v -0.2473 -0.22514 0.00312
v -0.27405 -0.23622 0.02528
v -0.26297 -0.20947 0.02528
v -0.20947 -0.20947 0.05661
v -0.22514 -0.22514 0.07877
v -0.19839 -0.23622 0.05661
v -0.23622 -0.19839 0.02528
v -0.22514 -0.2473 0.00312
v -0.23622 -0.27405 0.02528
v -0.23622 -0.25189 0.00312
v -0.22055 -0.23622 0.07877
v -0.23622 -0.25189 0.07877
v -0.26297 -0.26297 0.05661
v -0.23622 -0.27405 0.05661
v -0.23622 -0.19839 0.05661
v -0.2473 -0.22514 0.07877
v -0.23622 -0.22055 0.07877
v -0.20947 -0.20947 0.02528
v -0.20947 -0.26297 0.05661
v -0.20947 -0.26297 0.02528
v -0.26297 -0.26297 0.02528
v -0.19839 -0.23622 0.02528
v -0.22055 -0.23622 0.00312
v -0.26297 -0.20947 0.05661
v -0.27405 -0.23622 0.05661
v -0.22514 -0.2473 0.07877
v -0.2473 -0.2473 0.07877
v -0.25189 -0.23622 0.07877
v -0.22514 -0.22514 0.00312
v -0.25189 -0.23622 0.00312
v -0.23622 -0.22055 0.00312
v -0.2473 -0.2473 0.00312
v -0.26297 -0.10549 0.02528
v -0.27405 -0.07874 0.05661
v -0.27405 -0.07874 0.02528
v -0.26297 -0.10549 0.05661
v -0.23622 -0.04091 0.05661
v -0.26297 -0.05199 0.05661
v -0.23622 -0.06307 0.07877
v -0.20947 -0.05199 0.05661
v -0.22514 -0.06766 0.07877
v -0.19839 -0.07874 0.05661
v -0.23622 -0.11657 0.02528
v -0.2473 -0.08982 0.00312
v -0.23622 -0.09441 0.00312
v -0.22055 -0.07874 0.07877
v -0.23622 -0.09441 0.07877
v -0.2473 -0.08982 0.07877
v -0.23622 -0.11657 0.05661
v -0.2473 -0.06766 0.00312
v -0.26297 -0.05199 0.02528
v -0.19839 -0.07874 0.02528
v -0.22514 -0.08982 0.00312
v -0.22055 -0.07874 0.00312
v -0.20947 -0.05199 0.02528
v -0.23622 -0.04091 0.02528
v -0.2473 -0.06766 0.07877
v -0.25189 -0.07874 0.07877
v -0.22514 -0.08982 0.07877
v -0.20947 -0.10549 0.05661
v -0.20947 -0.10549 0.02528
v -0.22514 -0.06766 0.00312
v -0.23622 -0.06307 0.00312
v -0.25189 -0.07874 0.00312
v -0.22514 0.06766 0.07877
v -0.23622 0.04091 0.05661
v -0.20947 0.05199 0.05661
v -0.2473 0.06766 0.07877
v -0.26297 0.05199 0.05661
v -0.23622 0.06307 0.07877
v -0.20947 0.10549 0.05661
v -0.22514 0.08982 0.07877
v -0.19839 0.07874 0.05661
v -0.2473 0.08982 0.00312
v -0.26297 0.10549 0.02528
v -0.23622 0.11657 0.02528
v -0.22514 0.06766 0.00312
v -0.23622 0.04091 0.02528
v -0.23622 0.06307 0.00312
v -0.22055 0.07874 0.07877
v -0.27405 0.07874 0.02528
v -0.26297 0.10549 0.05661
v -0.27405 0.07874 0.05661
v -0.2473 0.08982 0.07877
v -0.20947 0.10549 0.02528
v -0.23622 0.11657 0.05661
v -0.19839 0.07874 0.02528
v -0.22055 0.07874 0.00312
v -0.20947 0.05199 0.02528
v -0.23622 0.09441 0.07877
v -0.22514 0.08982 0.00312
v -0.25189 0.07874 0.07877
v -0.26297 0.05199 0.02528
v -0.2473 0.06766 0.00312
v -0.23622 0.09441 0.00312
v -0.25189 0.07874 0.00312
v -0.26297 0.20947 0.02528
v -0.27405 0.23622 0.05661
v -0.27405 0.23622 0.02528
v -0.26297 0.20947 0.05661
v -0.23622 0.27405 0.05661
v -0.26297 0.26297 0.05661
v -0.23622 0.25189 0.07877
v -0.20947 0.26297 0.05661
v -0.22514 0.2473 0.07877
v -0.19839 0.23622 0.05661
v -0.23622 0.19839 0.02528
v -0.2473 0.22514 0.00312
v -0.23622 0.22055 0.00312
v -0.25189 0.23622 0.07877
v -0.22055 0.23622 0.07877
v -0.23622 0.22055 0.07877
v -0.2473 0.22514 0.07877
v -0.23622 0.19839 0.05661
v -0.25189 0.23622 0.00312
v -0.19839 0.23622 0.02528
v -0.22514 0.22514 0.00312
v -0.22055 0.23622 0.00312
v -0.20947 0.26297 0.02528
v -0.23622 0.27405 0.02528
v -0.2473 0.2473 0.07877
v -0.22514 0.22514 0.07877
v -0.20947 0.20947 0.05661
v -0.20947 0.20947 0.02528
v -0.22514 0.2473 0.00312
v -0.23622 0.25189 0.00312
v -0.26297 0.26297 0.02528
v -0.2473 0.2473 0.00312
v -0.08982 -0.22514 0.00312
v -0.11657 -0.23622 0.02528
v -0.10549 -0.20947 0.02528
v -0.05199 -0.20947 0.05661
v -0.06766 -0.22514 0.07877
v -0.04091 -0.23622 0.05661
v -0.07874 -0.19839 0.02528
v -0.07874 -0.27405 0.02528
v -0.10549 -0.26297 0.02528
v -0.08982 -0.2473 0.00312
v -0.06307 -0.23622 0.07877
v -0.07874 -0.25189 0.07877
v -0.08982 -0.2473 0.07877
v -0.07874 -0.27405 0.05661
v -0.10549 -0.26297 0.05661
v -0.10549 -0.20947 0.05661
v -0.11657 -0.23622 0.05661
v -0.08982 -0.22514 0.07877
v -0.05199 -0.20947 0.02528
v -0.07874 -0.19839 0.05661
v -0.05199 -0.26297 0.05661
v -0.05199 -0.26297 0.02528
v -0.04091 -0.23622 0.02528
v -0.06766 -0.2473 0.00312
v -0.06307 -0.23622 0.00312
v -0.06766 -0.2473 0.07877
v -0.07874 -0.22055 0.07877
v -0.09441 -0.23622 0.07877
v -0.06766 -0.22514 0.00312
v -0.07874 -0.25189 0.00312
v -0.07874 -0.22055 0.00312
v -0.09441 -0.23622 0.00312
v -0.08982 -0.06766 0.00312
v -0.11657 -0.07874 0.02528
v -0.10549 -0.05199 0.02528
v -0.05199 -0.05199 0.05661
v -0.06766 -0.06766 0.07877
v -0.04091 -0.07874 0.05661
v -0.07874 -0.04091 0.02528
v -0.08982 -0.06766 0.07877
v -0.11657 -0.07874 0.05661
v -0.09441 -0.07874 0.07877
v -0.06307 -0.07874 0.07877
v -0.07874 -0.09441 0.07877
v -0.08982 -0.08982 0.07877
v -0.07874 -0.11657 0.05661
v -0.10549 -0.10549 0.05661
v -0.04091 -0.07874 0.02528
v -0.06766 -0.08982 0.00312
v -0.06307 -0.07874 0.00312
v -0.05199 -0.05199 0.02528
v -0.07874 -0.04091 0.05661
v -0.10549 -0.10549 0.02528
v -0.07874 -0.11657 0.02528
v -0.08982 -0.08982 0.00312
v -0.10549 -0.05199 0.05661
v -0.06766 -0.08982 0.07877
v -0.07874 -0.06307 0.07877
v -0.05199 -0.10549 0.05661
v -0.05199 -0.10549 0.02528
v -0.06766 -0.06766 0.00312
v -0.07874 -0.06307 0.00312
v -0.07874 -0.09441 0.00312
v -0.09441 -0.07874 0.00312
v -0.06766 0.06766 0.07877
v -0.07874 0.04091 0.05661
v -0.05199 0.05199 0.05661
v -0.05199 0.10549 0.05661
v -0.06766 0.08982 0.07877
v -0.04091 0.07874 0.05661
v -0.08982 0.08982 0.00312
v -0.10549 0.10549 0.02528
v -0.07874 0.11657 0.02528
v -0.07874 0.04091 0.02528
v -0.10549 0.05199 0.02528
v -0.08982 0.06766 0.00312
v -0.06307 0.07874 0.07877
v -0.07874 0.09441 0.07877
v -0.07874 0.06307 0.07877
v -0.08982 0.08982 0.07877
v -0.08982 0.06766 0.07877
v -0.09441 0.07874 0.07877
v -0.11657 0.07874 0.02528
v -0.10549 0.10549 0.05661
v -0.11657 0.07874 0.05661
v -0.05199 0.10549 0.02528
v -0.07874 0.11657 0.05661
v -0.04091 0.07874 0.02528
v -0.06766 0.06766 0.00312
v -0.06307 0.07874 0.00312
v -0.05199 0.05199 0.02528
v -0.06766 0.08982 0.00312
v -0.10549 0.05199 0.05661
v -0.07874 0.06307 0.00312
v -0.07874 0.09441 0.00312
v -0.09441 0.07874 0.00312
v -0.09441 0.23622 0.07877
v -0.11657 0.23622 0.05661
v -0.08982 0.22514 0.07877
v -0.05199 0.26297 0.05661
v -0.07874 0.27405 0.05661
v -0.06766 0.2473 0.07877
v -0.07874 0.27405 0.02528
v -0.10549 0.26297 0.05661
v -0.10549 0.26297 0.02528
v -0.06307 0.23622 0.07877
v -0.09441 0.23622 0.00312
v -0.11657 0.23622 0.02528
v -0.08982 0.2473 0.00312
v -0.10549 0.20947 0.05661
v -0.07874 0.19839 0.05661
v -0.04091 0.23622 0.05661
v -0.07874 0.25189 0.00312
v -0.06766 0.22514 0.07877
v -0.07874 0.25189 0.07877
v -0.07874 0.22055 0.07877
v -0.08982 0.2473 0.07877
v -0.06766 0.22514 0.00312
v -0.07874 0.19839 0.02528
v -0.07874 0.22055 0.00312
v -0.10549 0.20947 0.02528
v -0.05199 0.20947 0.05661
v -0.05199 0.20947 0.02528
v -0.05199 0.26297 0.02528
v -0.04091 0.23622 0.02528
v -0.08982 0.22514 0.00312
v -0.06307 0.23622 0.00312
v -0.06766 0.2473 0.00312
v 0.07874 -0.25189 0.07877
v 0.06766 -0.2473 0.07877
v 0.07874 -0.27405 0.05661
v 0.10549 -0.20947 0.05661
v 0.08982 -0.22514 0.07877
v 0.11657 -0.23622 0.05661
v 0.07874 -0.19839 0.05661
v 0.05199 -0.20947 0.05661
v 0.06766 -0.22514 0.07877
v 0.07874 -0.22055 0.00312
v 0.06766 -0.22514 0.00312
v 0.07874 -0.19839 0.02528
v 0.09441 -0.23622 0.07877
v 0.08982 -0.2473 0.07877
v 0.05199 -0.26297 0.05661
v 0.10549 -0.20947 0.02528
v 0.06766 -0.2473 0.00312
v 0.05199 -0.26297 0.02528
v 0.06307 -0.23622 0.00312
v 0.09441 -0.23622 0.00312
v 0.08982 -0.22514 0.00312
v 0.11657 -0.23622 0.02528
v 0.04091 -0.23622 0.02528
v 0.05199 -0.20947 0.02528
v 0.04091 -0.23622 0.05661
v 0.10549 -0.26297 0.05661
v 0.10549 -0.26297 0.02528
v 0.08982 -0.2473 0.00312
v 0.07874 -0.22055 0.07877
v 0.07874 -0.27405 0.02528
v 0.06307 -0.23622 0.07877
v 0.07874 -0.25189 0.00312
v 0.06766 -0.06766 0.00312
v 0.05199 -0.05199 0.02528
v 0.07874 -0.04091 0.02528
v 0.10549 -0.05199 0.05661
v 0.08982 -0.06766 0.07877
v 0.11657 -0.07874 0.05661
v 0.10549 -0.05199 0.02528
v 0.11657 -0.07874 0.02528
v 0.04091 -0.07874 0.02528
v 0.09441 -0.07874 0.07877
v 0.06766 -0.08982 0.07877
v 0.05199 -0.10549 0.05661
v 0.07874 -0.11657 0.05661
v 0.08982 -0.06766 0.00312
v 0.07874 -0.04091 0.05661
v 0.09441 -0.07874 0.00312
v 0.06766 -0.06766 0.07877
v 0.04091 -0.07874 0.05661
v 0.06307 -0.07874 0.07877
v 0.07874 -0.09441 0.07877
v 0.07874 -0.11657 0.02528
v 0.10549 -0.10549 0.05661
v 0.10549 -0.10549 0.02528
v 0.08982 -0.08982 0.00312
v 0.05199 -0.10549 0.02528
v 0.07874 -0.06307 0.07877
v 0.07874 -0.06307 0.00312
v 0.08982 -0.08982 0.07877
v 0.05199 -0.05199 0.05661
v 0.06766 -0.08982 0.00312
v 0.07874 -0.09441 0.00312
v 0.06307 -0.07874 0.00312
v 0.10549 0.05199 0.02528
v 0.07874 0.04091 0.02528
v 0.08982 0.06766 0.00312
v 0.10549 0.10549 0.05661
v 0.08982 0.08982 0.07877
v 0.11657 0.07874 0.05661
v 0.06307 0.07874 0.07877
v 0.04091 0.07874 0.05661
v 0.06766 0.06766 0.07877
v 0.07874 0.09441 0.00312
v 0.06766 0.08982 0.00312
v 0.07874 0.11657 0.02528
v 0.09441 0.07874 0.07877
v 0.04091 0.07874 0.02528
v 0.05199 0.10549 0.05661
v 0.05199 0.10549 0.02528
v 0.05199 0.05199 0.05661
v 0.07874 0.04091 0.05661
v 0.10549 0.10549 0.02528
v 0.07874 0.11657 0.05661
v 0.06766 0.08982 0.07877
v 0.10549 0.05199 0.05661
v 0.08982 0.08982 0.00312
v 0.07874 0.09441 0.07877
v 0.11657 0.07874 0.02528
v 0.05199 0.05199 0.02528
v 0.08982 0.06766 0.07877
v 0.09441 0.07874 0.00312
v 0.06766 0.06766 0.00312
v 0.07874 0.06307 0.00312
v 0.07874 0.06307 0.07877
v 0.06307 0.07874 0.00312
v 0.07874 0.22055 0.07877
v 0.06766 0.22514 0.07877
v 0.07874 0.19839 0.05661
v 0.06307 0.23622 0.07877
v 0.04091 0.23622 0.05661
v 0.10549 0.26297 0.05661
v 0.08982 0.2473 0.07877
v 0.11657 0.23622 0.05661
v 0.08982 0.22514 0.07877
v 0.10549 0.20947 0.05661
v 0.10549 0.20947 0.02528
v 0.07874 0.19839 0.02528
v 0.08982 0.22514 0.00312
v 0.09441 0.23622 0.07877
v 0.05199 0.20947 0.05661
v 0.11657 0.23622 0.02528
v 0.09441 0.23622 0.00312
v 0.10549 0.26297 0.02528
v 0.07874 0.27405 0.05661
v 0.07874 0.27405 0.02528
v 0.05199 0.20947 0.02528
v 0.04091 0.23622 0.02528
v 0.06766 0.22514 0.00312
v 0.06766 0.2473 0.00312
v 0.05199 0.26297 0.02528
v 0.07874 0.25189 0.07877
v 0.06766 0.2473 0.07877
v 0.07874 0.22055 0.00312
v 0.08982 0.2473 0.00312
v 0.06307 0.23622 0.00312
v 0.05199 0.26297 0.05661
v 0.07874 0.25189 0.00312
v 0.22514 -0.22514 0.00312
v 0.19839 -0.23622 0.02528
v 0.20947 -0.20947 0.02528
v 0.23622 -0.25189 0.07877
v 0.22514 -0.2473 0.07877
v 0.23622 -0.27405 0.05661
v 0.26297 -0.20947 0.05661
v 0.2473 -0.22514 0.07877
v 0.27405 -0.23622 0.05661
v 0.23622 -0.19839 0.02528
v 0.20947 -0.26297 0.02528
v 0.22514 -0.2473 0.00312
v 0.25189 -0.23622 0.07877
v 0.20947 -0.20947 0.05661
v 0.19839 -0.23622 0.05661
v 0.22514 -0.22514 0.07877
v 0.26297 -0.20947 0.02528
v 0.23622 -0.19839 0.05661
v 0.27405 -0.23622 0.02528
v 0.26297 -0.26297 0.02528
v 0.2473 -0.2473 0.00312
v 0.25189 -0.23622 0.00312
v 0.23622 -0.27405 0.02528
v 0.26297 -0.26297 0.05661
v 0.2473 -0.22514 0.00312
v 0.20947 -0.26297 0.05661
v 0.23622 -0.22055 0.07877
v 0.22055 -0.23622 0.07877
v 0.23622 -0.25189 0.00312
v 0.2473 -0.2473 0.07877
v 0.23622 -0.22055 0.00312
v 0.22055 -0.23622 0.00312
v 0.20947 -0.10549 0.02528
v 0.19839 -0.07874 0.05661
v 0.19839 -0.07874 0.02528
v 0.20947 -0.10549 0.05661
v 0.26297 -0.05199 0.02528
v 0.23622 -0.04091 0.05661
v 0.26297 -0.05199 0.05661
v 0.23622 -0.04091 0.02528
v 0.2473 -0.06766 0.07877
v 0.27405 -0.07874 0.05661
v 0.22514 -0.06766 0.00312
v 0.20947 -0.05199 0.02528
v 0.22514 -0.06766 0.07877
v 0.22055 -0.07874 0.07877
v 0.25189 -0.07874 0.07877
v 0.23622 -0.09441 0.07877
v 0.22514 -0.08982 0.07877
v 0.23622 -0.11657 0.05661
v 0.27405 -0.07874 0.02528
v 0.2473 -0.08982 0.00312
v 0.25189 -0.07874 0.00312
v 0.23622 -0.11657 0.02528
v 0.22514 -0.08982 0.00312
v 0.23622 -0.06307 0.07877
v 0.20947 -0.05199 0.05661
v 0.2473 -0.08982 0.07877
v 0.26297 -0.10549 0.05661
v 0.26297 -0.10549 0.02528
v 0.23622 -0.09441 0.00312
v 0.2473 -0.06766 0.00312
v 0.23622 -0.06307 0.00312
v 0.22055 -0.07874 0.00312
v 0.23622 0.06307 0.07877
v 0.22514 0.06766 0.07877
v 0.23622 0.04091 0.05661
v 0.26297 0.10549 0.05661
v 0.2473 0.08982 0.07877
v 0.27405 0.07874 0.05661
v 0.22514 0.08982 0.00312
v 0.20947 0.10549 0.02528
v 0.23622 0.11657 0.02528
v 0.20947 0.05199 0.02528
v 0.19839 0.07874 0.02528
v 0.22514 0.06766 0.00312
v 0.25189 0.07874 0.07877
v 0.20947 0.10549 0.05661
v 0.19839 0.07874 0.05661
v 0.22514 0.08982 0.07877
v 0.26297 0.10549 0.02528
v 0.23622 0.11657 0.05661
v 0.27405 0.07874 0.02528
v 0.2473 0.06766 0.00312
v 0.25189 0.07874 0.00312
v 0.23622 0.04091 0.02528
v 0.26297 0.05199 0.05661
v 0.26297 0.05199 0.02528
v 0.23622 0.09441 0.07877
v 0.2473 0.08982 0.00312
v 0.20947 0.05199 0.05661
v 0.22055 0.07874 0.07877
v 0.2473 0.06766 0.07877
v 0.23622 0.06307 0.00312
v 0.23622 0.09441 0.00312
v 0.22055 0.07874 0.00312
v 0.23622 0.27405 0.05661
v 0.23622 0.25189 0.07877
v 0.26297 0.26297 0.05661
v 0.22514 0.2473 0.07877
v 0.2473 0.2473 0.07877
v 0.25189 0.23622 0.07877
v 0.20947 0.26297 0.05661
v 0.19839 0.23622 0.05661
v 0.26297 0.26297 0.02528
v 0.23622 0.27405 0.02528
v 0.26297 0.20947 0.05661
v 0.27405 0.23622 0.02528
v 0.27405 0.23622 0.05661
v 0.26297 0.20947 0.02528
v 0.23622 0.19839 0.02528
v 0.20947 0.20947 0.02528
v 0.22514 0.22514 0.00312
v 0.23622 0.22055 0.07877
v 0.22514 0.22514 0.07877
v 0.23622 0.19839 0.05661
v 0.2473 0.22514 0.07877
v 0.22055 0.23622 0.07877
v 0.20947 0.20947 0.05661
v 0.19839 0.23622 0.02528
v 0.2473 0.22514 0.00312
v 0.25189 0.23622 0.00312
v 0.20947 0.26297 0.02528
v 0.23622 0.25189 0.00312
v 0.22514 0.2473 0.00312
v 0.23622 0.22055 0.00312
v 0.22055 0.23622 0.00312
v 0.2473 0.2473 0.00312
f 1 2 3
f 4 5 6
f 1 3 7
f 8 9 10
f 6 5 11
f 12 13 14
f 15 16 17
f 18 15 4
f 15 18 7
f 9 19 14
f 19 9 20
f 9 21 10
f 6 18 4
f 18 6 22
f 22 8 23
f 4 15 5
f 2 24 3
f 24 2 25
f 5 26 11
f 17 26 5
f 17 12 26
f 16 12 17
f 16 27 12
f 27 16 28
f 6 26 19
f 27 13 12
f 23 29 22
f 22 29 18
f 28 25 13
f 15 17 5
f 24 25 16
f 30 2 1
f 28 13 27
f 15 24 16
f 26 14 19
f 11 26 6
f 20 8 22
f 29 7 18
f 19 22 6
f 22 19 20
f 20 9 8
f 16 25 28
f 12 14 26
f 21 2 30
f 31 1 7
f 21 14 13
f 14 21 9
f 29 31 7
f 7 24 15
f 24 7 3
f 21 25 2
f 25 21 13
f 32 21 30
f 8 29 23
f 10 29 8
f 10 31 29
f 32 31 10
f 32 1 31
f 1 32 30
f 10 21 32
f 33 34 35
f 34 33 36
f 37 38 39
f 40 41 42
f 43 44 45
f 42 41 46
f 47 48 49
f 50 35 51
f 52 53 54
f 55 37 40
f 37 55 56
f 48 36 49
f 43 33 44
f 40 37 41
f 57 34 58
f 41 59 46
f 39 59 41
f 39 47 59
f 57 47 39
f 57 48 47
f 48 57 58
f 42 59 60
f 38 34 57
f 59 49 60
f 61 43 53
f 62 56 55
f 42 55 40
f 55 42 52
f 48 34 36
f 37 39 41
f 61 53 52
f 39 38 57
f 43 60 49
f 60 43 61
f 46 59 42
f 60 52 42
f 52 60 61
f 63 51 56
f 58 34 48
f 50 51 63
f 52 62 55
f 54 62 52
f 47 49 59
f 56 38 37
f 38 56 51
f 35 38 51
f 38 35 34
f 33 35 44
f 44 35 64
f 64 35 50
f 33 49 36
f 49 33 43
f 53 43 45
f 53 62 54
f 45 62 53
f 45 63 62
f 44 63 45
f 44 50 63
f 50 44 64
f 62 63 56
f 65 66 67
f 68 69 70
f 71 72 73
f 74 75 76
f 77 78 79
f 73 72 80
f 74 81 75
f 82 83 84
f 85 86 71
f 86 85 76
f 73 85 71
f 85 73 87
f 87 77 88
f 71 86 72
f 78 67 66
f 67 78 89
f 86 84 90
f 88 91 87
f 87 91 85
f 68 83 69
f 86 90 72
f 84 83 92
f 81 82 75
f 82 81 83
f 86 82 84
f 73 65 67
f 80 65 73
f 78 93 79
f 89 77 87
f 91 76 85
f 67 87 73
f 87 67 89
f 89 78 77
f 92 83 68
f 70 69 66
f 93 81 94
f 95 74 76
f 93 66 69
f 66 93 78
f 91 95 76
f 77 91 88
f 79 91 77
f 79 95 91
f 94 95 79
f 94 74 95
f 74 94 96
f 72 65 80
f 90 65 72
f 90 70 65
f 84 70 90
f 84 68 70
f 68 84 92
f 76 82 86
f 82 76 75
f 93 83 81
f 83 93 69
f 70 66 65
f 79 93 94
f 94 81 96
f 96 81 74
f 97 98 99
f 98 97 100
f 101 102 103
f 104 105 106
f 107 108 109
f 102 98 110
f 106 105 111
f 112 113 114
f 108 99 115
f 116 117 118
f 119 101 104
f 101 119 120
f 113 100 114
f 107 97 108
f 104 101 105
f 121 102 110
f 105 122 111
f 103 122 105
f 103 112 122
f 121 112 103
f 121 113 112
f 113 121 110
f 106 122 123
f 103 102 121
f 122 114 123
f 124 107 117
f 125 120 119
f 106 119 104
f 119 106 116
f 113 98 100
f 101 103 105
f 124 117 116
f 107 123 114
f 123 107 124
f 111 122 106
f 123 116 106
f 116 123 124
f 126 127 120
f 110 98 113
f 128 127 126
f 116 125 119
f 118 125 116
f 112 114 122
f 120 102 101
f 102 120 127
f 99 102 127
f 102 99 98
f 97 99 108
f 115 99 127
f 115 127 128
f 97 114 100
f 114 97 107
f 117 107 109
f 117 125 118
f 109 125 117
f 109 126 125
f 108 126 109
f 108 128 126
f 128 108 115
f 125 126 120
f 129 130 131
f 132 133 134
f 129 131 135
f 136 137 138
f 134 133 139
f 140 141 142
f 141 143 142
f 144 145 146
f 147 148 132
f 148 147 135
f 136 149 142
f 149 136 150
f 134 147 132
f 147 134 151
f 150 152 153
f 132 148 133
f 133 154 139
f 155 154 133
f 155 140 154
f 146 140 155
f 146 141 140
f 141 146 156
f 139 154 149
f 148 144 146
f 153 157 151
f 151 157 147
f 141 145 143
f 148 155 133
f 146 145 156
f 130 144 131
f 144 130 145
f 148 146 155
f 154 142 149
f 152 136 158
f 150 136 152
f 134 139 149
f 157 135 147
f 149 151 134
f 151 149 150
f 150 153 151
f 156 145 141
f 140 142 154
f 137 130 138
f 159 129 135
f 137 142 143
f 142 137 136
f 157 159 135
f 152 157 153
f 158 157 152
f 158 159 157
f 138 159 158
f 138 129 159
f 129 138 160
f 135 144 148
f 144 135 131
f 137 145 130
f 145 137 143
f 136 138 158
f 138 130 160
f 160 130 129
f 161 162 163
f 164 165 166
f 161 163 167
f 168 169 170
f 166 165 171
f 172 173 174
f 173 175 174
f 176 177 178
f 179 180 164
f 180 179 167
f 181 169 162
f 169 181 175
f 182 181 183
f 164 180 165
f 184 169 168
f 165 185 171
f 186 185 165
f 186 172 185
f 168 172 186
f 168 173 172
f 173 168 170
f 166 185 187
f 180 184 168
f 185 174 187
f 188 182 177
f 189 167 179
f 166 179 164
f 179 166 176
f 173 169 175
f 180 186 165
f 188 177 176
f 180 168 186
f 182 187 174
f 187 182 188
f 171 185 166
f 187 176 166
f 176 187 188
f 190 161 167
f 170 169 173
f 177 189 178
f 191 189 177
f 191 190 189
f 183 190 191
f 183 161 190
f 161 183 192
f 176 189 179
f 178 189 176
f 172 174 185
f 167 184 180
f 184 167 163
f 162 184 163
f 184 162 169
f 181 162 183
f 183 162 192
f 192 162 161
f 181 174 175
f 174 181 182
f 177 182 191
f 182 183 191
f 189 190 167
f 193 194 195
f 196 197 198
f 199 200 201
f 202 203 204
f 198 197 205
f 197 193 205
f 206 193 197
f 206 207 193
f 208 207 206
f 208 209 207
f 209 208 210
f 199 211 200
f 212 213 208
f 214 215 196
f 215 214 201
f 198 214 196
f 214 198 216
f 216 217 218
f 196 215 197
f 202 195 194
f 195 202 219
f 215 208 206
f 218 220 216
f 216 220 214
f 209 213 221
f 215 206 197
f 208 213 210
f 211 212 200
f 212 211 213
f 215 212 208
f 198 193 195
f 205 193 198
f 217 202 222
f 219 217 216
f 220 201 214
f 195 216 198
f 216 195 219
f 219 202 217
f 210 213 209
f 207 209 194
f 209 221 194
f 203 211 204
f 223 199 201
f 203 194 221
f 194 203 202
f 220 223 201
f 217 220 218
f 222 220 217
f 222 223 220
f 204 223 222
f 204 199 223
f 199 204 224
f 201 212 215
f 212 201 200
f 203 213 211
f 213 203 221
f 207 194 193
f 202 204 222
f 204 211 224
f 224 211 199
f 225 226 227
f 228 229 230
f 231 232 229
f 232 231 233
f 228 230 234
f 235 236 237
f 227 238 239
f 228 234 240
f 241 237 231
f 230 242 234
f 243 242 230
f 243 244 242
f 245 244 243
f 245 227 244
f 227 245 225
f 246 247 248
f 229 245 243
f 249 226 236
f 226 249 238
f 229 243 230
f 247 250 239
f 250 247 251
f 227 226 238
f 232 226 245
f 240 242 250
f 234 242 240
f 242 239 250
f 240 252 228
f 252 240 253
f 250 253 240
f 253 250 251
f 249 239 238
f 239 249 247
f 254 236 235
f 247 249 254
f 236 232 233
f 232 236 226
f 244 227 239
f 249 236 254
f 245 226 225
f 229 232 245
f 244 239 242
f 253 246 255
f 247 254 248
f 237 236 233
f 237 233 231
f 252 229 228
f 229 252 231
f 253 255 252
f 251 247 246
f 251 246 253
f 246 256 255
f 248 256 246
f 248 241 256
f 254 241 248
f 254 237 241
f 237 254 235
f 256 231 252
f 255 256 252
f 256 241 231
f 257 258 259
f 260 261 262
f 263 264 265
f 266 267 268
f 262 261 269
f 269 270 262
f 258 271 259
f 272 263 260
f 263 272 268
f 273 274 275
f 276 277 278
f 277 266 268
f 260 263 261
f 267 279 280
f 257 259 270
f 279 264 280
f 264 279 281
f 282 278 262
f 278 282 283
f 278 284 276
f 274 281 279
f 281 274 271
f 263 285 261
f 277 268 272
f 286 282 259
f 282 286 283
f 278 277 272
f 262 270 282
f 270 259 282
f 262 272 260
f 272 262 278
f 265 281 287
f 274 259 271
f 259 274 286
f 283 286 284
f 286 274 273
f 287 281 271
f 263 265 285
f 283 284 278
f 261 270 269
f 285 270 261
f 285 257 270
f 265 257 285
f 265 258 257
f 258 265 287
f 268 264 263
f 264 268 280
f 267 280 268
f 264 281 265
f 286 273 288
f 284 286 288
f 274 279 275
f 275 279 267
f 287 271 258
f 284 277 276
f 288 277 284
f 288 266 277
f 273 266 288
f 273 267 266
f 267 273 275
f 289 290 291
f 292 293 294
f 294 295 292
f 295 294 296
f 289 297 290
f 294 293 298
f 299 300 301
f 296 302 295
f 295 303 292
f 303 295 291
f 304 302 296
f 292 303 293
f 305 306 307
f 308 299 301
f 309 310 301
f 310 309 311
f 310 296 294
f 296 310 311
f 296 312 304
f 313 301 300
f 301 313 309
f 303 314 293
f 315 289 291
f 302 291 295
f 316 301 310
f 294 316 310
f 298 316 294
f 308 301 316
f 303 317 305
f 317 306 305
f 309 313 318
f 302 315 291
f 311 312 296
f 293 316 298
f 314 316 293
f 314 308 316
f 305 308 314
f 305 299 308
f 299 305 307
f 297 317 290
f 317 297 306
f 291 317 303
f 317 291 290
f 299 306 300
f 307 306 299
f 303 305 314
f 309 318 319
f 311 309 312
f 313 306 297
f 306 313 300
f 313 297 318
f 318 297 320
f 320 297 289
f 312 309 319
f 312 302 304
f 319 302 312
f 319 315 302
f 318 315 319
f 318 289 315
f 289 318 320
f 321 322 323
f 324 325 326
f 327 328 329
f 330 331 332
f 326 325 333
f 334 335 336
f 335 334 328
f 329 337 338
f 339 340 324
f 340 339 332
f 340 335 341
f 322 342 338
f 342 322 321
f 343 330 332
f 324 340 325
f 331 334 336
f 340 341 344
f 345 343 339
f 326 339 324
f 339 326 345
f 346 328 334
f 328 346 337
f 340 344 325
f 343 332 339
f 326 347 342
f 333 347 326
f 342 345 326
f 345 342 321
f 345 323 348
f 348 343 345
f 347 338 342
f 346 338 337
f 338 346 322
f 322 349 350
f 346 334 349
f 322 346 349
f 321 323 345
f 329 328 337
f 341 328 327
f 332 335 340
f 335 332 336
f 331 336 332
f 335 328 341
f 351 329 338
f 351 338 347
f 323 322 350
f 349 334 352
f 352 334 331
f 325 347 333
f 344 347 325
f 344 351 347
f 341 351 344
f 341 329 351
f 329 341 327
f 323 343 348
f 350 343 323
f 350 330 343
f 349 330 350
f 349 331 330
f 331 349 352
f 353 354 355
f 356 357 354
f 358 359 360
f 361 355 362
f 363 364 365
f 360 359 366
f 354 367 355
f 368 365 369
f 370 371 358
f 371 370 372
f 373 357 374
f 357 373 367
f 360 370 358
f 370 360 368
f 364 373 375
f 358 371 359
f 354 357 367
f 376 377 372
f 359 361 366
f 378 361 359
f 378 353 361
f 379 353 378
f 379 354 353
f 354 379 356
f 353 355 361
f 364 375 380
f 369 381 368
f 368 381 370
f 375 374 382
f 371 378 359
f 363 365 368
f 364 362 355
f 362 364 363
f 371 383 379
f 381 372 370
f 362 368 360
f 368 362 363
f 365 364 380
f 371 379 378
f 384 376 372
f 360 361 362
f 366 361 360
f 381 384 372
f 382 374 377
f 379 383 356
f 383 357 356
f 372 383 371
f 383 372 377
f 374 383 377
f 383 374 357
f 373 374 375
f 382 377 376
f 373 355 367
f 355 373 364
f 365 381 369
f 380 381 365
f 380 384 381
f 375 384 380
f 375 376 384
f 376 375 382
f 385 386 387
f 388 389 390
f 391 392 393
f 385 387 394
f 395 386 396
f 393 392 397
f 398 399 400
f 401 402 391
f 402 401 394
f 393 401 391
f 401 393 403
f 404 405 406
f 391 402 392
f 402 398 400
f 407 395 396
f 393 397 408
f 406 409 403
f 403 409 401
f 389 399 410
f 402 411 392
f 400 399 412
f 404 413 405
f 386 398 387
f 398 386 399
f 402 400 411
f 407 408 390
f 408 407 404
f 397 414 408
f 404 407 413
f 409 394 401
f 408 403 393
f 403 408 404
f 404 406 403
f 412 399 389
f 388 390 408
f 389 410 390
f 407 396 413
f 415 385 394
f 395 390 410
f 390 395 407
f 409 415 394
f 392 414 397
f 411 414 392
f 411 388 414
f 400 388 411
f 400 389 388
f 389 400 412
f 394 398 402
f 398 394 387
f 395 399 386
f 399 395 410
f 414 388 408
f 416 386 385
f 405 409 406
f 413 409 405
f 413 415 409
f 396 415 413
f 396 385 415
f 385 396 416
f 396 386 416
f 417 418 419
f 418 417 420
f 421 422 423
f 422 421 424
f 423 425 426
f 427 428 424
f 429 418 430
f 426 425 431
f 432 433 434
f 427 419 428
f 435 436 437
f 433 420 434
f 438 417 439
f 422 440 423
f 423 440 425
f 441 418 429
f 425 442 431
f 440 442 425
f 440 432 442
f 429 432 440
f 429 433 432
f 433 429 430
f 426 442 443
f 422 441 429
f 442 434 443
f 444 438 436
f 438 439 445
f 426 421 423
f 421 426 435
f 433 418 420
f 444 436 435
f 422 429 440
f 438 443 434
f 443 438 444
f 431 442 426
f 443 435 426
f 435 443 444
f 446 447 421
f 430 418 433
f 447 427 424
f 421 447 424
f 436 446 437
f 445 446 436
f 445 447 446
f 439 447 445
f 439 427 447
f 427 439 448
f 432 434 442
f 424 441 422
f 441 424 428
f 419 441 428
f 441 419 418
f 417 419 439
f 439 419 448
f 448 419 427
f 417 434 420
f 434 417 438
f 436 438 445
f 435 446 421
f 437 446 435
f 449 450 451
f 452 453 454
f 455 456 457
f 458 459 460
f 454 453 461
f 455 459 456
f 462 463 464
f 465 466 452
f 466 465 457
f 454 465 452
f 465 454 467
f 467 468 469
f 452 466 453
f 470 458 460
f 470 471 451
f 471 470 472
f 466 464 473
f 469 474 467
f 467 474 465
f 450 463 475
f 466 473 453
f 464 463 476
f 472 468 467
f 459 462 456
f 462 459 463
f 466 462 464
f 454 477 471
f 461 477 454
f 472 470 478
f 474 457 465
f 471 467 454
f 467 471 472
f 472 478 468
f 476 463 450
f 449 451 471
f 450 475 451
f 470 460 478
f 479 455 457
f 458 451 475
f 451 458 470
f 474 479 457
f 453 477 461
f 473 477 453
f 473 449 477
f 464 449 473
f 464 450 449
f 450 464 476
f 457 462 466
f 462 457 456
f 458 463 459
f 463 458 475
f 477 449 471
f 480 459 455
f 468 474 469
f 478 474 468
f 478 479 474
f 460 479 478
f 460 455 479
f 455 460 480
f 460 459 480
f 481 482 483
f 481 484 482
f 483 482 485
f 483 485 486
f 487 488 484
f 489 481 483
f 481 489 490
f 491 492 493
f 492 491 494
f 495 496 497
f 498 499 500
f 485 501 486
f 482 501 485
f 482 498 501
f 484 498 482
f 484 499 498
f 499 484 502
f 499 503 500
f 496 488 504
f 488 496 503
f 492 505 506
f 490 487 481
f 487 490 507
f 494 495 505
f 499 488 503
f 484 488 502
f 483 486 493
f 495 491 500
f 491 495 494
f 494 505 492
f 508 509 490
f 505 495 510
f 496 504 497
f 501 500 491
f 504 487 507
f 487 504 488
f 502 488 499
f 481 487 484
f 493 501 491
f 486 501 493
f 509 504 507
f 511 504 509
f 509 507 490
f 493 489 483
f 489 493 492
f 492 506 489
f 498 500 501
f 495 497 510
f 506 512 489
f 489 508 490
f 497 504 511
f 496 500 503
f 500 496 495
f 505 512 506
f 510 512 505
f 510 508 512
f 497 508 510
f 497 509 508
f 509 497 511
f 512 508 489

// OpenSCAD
// file: defines.scad
L = 1.810;  // Длина
W = 1.810;  // Ширина
H = 0.586;  // Высота
Hf = 0.208;  // Возвышение над платой (высота выводов)
e = 0.4;    // Шаг выводов

pin_fragments = 16;

scale = 1/2.54;
// main file
include <defines.scad>

p_w = 0.567;
p_h = 0.3;

p_co = 1.5 - 0.667 + p_w/2;

module Pin(x, y, z) {
color("Gold")
  translate([x,y,z])
  union() {
    sphere([-0,0,0], d=Hf, $fn=8);
  }
}

scale(scale)
  translate([0,0,Hf/2])
  union() {
    for(i = [0 : 3]) {
      for(j = [0 : 3]) {
        Pin(i*0.4-0.6, j*0.4-0.6, 0); // #1
      }
    }


  };
